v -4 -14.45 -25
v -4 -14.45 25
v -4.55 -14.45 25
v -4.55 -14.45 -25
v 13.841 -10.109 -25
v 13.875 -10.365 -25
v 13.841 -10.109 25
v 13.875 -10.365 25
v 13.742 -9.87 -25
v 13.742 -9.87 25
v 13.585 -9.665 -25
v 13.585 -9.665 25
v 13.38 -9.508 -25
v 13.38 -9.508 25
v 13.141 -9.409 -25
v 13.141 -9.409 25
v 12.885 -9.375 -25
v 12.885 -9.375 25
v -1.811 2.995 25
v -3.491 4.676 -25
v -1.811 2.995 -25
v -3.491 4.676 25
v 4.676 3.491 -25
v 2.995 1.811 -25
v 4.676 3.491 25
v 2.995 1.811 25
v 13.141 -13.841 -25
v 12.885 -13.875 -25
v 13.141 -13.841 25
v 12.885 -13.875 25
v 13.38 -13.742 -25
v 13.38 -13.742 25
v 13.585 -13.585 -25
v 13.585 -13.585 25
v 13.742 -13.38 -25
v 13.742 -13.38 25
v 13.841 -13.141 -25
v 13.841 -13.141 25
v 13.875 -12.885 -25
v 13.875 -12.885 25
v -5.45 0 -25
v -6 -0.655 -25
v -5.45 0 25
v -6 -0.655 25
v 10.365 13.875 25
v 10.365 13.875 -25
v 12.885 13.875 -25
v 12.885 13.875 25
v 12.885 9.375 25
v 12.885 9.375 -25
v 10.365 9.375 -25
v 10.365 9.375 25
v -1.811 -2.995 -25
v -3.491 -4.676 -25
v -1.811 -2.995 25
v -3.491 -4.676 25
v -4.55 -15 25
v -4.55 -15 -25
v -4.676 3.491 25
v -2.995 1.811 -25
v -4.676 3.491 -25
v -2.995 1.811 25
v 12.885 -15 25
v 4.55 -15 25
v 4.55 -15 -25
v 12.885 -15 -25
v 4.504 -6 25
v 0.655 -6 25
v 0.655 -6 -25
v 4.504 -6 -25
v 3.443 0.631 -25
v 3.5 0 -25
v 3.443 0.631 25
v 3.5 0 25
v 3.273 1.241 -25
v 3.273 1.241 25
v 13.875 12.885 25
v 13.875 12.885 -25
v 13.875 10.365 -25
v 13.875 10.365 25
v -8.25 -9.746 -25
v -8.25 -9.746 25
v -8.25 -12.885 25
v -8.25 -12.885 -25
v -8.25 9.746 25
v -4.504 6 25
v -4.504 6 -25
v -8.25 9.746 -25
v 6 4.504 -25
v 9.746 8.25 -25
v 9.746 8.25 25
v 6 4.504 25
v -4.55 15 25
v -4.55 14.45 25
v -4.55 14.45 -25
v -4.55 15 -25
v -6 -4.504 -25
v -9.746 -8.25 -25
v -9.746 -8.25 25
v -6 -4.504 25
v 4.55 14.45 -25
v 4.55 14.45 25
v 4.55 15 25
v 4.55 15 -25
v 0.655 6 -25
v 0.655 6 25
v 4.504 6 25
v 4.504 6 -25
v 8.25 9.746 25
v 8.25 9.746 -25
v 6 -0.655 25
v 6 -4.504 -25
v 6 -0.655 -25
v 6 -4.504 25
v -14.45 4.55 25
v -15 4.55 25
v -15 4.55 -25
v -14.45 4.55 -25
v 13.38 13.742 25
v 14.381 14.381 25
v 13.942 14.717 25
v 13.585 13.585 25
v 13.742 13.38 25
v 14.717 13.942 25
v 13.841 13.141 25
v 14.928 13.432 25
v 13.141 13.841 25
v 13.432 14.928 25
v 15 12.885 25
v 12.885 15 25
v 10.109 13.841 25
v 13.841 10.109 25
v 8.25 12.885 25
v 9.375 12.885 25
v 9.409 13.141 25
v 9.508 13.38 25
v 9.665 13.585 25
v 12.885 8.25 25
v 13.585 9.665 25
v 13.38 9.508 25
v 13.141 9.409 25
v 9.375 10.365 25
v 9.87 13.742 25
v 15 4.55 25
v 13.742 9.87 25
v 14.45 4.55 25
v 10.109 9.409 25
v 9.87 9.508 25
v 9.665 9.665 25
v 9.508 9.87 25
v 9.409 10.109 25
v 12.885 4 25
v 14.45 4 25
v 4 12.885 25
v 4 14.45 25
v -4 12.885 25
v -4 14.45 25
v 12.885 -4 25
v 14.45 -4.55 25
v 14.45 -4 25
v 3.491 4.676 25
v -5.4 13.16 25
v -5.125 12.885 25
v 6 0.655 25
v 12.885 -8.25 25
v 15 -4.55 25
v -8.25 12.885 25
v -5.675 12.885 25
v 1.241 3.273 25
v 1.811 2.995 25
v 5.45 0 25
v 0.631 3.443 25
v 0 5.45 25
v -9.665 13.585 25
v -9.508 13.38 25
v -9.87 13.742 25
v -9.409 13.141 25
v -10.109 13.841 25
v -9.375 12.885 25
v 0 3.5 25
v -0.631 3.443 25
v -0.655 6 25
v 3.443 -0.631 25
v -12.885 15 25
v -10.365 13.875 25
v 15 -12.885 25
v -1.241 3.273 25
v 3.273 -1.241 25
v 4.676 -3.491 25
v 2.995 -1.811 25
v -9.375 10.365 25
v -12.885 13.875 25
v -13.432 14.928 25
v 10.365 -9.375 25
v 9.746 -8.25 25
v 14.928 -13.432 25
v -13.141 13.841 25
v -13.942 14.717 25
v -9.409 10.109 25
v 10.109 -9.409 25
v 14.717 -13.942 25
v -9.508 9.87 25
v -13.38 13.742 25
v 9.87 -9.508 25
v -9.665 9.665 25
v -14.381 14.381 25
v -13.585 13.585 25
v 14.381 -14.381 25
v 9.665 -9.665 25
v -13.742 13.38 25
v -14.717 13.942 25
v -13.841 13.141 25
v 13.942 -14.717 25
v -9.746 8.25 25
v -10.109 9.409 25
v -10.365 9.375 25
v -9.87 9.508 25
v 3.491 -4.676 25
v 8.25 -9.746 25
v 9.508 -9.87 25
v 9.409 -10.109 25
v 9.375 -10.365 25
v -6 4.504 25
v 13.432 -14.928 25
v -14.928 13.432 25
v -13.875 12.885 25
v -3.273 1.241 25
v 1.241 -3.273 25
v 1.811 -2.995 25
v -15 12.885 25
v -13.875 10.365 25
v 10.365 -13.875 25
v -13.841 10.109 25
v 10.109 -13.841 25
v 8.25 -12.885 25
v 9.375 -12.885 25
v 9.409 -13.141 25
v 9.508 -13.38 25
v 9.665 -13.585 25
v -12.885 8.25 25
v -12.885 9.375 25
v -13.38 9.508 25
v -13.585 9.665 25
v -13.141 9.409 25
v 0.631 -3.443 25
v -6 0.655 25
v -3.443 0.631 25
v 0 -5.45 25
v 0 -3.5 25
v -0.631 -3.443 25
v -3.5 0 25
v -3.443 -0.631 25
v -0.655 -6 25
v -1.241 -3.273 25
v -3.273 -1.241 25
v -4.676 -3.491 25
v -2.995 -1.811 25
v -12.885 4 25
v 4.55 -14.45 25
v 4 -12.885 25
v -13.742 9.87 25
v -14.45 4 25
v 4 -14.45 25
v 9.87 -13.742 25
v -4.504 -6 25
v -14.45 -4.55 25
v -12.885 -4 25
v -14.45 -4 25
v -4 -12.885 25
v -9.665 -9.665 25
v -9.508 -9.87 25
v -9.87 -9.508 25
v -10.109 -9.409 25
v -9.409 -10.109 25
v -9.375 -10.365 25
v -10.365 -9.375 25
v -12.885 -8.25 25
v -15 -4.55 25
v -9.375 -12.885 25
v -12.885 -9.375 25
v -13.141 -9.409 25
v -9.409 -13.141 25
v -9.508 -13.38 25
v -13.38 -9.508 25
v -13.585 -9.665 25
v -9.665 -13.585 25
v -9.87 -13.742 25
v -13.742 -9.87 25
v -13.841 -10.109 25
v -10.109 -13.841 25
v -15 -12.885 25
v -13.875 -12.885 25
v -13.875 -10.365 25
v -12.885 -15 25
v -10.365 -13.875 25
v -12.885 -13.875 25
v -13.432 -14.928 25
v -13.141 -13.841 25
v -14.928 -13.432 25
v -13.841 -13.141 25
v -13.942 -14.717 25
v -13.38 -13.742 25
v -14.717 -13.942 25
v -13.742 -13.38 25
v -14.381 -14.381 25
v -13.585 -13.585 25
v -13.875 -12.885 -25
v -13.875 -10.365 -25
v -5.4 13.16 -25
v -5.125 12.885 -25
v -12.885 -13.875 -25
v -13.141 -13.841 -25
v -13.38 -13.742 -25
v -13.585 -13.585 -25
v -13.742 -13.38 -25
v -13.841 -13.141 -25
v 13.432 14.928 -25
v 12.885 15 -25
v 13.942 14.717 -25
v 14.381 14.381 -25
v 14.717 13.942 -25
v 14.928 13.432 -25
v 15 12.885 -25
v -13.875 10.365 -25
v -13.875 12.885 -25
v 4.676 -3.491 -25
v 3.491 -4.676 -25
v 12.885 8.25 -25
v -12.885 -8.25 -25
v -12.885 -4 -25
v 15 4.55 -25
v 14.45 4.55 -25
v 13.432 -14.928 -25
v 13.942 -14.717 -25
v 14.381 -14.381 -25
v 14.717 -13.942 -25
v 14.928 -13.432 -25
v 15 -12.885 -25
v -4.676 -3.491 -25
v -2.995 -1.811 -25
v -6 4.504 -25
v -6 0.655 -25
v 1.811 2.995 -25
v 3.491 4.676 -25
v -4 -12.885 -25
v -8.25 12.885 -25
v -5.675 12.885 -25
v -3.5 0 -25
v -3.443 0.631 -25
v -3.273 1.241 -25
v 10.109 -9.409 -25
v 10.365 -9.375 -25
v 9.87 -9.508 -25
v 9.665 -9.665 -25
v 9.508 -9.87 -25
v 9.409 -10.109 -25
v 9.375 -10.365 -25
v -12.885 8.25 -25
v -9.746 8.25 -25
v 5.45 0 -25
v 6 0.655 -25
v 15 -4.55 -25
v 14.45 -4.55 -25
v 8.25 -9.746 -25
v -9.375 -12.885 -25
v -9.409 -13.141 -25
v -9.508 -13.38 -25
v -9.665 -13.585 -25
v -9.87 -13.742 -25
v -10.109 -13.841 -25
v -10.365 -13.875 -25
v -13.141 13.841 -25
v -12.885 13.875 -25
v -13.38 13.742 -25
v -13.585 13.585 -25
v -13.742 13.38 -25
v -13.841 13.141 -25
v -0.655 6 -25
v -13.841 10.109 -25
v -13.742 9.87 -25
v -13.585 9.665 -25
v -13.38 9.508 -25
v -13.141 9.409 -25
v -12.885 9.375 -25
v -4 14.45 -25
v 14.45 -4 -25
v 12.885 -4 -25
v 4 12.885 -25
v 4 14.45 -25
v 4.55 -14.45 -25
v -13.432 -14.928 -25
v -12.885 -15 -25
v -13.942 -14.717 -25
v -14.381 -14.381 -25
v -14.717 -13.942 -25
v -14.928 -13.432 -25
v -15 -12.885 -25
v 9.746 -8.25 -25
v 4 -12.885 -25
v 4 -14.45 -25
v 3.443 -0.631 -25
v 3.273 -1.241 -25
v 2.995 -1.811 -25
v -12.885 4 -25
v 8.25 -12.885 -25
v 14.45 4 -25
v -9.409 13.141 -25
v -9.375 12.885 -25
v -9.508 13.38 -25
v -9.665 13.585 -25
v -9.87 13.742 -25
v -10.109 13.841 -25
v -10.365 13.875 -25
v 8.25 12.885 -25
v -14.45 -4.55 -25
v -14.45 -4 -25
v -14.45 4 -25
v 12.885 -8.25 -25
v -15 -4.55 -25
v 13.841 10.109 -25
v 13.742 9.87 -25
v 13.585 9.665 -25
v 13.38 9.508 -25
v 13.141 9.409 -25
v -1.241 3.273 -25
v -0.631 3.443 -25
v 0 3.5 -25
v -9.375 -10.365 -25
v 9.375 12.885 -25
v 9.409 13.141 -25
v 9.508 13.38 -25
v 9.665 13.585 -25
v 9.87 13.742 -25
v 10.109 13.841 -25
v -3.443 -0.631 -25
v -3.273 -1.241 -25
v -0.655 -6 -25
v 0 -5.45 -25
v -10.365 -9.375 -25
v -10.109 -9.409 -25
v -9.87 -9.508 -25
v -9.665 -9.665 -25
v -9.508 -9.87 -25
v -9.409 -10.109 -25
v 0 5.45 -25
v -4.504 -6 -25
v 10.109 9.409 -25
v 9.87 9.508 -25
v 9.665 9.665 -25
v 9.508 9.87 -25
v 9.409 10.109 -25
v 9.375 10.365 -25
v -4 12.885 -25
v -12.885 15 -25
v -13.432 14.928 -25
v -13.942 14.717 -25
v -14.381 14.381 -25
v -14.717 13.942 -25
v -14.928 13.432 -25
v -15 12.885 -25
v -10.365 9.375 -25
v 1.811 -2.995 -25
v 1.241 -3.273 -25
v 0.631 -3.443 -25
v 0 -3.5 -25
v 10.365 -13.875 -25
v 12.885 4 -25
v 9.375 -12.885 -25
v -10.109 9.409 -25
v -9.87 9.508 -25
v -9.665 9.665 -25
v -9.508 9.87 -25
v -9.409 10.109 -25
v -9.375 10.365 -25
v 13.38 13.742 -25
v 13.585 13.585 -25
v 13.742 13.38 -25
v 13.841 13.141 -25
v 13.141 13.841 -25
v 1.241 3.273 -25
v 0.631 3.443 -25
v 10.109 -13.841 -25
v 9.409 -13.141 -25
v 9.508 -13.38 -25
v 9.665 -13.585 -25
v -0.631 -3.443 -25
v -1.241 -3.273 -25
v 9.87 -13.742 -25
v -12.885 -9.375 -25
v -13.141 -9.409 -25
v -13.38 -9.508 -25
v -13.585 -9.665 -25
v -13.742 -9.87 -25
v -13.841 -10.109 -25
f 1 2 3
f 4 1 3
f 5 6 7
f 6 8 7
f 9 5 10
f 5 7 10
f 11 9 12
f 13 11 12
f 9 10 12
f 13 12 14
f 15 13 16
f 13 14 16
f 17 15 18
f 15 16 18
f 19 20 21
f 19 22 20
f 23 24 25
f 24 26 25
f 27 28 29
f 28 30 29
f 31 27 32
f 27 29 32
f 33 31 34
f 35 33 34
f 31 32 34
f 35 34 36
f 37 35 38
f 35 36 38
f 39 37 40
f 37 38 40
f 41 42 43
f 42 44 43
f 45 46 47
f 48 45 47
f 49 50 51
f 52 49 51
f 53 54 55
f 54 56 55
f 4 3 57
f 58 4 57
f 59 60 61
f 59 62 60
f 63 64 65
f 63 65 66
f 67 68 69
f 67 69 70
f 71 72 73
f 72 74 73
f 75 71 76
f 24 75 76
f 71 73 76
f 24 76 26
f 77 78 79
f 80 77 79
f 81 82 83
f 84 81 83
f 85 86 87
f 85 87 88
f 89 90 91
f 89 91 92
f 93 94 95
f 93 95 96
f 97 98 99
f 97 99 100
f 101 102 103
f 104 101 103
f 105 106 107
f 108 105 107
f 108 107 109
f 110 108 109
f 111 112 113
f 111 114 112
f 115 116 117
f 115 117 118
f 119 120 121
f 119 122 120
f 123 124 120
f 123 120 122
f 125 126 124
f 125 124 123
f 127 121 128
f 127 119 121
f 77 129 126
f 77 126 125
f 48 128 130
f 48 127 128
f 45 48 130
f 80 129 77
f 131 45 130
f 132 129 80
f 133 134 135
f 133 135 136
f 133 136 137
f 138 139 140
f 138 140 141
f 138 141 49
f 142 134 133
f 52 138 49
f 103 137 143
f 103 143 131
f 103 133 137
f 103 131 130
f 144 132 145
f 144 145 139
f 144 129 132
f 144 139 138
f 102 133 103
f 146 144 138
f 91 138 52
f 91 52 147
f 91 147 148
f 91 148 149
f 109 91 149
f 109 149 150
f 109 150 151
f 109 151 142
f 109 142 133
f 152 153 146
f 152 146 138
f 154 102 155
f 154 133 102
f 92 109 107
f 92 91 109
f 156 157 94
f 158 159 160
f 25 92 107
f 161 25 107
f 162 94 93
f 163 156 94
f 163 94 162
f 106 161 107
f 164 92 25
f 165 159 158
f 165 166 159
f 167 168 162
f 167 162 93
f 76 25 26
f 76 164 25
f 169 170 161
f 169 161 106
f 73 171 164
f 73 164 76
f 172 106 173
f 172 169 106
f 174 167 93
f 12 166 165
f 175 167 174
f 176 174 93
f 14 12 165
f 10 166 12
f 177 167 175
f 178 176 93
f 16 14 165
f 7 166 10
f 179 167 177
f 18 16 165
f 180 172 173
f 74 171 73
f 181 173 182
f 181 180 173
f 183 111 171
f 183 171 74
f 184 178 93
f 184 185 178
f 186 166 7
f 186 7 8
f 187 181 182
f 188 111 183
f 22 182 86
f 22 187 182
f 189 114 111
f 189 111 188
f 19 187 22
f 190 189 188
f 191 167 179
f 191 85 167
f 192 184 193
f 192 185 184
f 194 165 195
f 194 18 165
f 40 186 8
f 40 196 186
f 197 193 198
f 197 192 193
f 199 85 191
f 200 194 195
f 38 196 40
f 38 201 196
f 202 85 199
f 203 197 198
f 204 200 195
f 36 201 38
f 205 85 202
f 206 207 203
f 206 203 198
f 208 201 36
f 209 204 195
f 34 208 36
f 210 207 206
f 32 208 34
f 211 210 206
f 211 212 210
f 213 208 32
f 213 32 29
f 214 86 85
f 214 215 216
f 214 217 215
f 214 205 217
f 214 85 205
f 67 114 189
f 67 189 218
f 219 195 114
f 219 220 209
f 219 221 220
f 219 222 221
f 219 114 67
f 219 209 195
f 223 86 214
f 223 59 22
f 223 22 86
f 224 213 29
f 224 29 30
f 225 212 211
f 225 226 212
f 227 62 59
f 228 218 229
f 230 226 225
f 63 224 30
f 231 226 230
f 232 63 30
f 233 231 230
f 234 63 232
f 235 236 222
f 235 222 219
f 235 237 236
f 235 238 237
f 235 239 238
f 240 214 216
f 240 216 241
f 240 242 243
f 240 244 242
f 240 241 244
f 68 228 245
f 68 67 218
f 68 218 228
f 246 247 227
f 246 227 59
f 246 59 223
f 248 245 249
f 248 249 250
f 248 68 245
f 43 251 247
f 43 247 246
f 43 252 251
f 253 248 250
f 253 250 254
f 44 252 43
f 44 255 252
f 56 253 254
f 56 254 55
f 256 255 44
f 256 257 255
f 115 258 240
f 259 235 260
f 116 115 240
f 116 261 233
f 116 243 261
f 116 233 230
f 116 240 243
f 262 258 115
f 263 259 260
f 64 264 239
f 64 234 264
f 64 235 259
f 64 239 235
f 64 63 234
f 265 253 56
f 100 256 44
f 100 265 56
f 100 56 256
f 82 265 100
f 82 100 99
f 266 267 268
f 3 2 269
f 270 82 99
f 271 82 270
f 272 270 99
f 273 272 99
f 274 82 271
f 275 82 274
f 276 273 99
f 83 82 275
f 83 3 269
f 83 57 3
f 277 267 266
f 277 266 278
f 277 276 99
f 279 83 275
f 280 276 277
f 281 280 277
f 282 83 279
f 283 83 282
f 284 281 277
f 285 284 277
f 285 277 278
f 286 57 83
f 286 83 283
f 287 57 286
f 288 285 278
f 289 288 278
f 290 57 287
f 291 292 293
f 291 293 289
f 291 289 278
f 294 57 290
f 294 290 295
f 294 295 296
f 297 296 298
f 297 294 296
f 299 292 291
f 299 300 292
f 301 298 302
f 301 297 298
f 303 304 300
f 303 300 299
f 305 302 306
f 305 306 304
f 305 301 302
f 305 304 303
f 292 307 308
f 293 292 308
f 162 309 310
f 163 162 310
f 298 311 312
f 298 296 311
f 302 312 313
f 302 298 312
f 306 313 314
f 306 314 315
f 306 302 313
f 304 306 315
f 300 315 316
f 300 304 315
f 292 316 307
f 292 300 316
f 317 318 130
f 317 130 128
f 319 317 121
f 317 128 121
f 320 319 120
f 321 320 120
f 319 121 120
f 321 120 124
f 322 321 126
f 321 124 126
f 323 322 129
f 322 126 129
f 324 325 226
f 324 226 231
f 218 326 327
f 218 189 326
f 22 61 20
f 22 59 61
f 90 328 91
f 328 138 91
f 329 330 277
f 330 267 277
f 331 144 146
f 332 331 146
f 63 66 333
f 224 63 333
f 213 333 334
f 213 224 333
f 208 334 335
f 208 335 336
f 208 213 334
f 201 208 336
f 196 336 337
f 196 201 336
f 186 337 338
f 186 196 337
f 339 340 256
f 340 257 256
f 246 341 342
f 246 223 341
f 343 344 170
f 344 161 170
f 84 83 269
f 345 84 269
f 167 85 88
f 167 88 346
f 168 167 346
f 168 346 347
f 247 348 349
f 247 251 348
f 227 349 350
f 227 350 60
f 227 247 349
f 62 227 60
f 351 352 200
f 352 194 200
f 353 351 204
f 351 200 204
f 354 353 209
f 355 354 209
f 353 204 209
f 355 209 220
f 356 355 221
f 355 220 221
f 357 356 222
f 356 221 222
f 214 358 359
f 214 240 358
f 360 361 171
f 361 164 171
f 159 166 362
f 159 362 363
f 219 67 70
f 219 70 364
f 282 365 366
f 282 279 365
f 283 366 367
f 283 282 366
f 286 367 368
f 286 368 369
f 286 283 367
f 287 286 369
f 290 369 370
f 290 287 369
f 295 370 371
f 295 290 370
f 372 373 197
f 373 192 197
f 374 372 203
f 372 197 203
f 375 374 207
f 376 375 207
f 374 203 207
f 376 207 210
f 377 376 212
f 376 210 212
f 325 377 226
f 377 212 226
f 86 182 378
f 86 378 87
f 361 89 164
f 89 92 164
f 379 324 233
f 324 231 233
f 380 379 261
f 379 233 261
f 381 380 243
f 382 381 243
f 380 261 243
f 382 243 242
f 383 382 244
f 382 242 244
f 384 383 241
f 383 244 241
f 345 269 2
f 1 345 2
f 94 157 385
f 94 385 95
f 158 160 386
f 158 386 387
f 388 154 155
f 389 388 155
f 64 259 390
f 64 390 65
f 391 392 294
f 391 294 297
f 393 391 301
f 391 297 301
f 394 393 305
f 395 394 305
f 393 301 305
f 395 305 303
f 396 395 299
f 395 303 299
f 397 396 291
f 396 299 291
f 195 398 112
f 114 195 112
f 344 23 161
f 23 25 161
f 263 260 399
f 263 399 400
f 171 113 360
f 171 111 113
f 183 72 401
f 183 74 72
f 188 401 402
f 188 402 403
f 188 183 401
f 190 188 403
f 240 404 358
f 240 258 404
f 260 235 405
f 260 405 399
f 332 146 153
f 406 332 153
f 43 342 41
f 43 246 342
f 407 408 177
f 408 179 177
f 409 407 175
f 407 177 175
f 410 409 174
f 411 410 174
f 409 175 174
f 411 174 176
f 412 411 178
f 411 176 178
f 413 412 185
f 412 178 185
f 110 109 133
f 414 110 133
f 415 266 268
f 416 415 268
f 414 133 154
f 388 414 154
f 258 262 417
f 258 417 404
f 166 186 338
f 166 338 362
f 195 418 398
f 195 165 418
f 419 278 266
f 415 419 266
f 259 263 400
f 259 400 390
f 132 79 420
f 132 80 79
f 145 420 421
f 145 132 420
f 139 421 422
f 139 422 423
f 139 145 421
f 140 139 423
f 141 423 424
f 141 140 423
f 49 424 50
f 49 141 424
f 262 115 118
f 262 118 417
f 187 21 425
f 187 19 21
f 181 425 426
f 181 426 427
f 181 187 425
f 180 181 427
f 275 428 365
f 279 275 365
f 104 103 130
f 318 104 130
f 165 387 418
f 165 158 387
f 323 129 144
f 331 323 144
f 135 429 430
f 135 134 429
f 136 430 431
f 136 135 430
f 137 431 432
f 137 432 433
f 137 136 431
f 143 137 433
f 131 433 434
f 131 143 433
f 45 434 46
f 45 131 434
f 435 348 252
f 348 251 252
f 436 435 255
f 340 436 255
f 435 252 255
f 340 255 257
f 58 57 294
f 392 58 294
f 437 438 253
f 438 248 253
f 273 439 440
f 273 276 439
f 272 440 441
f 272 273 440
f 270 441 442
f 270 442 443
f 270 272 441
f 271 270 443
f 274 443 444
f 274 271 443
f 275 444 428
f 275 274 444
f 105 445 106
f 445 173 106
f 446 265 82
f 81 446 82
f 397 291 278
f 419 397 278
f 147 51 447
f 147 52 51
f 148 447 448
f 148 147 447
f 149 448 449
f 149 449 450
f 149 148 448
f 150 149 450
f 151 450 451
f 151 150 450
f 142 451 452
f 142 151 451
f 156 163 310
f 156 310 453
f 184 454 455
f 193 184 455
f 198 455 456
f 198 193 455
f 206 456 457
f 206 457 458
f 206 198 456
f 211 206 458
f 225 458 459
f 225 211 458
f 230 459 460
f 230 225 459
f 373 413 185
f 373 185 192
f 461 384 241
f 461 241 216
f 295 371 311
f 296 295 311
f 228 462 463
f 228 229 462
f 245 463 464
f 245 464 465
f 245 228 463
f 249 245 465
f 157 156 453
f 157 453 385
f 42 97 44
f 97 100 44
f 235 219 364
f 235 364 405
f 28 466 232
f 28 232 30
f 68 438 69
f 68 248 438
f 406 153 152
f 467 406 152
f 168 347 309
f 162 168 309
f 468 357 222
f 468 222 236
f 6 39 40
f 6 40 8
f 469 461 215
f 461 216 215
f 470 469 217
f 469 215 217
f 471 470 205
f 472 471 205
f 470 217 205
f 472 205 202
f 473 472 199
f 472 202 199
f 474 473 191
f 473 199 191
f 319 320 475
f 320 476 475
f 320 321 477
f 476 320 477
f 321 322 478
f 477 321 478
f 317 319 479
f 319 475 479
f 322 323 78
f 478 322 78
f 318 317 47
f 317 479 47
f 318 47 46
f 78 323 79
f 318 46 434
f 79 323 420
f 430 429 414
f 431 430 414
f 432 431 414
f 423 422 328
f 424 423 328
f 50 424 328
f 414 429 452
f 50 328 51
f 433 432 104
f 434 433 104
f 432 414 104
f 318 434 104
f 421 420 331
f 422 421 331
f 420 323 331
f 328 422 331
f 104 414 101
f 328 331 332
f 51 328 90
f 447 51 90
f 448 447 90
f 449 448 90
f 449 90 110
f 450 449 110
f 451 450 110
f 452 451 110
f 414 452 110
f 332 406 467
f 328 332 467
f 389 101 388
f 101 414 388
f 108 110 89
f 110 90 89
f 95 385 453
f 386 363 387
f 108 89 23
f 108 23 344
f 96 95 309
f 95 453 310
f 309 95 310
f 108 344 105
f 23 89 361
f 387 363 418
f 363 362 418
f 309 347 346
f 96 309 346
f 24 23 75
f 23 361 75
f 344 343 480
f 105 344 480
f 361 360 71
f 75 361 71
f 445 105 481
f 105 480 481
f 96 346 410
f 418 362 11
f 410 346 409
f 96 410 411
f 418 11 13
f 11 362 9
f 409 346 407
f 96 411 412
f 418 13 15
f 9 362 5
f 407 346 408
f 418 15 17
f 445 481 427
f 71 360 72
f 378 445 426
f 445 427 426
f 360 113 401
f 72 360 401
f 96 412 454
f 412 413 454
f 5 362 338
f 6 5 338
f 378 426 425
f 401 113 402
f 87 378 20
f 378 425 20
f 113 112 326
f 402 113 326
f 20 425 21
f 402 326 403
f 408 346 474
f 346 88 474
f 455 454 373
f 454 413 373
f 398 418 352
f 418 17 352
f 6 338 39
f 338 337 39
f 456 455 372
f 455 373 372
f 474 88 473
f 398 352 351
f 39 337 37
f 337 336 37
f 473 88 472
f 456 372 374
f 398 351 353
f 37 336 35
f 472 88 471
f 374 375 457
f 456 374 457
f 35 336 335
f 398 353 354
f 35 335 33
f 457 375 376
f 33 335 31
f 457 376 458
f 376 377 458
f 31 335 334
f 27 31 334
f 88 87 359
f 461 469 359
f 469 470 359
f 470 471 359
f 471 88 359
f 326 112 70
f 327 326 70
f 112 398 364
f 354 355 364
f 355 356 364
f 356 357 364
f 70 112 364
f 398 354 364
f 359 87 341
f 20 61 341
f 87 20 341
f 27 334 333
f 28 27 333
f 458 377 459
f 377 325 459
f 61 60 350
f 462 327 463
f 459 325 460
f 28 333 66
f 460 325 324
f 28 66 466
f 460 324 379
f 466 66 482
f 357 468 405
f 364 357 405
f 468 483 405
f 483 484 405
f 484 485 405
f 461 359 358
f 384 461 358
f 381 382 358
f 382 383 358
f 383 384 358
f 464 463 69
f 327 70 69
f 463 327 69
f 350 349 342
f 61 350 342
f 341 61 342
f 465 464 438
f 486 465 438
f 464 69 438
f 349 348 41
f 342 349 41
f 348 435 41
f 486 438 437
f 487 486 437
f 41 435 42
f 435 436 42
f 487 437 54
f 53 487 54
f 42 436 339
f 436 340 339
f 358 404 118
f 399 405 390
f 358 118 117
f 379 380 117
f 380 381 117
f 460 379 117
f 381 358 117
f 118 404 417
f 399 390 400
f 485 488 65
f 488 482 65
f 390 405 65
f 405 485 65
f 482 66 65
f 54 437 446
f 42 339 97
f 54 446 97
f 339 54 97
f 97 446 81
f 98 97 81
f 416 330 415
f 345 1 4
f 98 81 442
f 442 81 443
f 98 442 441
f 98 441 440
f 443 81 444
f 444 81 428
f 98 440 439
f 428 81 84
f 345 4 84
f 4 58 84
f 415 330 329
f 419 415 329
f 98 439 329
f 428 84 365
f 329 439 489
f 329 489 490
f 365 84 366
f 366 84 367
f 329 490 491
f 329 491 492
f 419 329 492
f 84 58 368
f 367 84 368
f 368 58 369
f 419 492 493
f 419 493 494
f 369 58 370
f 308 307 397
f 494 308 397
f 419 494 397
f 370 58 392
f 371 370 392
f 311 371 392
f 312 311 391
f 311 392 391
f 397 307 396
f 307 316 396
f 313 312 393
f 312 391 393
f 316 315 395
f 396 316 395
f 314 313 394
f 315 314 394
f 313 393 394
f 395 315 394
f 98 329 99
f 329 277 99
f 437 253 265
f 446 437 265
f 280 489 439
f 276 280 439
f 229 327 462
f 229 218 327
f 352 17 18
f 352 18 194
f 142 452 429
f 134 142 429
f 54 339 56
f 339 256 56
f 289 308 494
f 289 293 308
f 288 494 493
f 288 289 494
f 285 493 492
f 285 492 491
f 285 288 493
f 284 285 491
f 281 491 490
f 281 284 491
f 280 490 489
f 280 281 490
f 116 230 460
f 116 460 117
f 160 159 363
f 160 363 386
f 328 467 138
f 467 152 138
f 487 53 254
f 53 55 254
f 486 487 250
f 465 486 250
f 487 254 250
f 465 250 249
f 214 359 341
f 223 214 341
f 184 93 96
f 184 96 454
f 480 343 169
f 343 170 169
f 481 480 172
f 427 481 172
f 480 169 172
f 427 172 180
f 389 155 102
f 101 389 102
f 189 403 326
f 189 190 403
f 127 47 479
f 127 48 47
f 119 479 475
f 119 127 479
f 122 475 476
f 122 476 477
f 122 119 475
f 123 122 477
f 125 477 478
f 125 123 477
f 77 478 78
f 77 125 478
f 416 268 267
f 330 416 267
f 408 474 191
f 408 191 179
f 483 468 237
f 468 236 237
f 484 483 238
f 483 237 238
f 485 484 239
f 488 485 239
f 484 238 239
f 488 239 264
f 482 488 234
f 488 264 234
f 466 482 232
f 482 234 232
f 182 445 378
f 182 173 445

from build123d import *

# Parameters (mm, degrees)
BOSS_EXTRUDE1_DEPTH     = 25
CUT_EXTRUDE1_DEPTH      = 1
CUT_EXTRUDE1_DEPTH_BACK = 51


with BuildPart() as part:
    # Sketch4 → Boss-Extrude1 (new body, symmetric)
    with BuildSketch(Plane.XY):
        with BuildLine():
            Line((0, -5.45), (0.655464476, -6))
            Line((0.655464476, -6), (4.504469158, -6))
            Line((4.504469158, -6), (8.25, -9.745530842))
            Line((8.25, -9.745530842), (8.25, -12.885))
            Line((8.25, -12.885), (4, -12.885))
            Line((4, -12.885), (4, -14.45))
            Line((4, -14.45), (4.55, -14.45))
            Line((4.55, -14.45), (4.55, -15))
            Line((4.55, -15), (12.885, -15))
            ThreePointArc((12.885, -15), (14.380530842, -14.380530842), (15, -12.885))
            Line((15, -12.885), (15, -4.55))
            Line((15, -4.55), (14.45, -4.55))
            Line((14.45, -4.55), (14.45, -4))
            Line((14.45, -4), (12.885, -4))
            Line((12.885, -4), (12.885, -8.25))
            Line((12.885, -8.25), (9.745530842, -8.25))
            Line((9.745530842, -8.25), (6, -4.504469158))
            Line((6, -4.504469158), (6, -0.655464476))
            Line((6, -0.655464476), (5.45, 0))
            Line((5.45, 0), (3.5, 0))
            ThreePointArc((3.5, 0), (3.371433308, -0.939913534), (2.995178599, -1.81077474))
            Line((2.995178599, -1.81077474), (4.675743591, -3.491339732))
            Line((4.675743591, -3.491339732), (3.491339732, -4.675743591))
            Line((3.491339732, -4.675743591), (1.81077474, -2.995178599))
            ThreePointArc((1.81077474, -2.995178599), (0.939913534, -3.371433308), (0, -3.5))
            Line((0, -3.5), (0, -5.45))
        make_face()
        with BuildLine():
            Line((9.375, -10.365), (9.375, -12.885))
            ThreePointArc((9.375, -12.885), (9.664964287, -13.585035713), (10.365, -13.875))
            Line((10.365, -13.875), (12.885, -13.875))
            ThreePointArc((12.885, -13.875), (13.585035713, -13.585035713), (13.875, -12.885))
            Line((13.875, -12.885), (13.875, -10.365))
            ThreePointArc((13.875, -10.365), (13.585035713, -9.664964287), (12.885, -9.375))
            Line((12.885, -9.375), (10.365, -9.375))
            ThreePointArc((10.365, -9.375), (9.664964287, -9.664964287), (9.375, -10.365))
        make_face(mode=Mode.SUBTRACT)
    extrude(amount=BOSS_EXTRUDE1_DEPTH, both=True)

    # Mirror1: part across plane


with BuildPart() as part_1:
    add(part.part)
    add(part.part.mirror(Plane(origin=(0, 0, 0), x_dir=(0, 0, 1), z_dir=(1, 0, 0))))

    # Mirror2: part across plane


with BuildPart() as part_2:
    add(part_1.part)
    add(part_1.part.mirror(Plane.ZX))

    # Sketch5 → Cut-Extrude1 (cut, two sides)
    with BuildSketch(Plane.XY.offset(25)) as cut_extrude1_sk:
        Polygon((-5.675, 12.885), (-5.4, 13.16), (-5.125, 12.885), align=None)
    extrude(amount=CUT_EXTRUDE1_DEPTH, mode=Mode.SUBTRACT)
    extrude(cut_extrude1_sk.sketch, amount=-CUT_EXTRUDE1_DEPTH_BACK, mode=Mode.SUBTRACT)


solid = part_2.part
